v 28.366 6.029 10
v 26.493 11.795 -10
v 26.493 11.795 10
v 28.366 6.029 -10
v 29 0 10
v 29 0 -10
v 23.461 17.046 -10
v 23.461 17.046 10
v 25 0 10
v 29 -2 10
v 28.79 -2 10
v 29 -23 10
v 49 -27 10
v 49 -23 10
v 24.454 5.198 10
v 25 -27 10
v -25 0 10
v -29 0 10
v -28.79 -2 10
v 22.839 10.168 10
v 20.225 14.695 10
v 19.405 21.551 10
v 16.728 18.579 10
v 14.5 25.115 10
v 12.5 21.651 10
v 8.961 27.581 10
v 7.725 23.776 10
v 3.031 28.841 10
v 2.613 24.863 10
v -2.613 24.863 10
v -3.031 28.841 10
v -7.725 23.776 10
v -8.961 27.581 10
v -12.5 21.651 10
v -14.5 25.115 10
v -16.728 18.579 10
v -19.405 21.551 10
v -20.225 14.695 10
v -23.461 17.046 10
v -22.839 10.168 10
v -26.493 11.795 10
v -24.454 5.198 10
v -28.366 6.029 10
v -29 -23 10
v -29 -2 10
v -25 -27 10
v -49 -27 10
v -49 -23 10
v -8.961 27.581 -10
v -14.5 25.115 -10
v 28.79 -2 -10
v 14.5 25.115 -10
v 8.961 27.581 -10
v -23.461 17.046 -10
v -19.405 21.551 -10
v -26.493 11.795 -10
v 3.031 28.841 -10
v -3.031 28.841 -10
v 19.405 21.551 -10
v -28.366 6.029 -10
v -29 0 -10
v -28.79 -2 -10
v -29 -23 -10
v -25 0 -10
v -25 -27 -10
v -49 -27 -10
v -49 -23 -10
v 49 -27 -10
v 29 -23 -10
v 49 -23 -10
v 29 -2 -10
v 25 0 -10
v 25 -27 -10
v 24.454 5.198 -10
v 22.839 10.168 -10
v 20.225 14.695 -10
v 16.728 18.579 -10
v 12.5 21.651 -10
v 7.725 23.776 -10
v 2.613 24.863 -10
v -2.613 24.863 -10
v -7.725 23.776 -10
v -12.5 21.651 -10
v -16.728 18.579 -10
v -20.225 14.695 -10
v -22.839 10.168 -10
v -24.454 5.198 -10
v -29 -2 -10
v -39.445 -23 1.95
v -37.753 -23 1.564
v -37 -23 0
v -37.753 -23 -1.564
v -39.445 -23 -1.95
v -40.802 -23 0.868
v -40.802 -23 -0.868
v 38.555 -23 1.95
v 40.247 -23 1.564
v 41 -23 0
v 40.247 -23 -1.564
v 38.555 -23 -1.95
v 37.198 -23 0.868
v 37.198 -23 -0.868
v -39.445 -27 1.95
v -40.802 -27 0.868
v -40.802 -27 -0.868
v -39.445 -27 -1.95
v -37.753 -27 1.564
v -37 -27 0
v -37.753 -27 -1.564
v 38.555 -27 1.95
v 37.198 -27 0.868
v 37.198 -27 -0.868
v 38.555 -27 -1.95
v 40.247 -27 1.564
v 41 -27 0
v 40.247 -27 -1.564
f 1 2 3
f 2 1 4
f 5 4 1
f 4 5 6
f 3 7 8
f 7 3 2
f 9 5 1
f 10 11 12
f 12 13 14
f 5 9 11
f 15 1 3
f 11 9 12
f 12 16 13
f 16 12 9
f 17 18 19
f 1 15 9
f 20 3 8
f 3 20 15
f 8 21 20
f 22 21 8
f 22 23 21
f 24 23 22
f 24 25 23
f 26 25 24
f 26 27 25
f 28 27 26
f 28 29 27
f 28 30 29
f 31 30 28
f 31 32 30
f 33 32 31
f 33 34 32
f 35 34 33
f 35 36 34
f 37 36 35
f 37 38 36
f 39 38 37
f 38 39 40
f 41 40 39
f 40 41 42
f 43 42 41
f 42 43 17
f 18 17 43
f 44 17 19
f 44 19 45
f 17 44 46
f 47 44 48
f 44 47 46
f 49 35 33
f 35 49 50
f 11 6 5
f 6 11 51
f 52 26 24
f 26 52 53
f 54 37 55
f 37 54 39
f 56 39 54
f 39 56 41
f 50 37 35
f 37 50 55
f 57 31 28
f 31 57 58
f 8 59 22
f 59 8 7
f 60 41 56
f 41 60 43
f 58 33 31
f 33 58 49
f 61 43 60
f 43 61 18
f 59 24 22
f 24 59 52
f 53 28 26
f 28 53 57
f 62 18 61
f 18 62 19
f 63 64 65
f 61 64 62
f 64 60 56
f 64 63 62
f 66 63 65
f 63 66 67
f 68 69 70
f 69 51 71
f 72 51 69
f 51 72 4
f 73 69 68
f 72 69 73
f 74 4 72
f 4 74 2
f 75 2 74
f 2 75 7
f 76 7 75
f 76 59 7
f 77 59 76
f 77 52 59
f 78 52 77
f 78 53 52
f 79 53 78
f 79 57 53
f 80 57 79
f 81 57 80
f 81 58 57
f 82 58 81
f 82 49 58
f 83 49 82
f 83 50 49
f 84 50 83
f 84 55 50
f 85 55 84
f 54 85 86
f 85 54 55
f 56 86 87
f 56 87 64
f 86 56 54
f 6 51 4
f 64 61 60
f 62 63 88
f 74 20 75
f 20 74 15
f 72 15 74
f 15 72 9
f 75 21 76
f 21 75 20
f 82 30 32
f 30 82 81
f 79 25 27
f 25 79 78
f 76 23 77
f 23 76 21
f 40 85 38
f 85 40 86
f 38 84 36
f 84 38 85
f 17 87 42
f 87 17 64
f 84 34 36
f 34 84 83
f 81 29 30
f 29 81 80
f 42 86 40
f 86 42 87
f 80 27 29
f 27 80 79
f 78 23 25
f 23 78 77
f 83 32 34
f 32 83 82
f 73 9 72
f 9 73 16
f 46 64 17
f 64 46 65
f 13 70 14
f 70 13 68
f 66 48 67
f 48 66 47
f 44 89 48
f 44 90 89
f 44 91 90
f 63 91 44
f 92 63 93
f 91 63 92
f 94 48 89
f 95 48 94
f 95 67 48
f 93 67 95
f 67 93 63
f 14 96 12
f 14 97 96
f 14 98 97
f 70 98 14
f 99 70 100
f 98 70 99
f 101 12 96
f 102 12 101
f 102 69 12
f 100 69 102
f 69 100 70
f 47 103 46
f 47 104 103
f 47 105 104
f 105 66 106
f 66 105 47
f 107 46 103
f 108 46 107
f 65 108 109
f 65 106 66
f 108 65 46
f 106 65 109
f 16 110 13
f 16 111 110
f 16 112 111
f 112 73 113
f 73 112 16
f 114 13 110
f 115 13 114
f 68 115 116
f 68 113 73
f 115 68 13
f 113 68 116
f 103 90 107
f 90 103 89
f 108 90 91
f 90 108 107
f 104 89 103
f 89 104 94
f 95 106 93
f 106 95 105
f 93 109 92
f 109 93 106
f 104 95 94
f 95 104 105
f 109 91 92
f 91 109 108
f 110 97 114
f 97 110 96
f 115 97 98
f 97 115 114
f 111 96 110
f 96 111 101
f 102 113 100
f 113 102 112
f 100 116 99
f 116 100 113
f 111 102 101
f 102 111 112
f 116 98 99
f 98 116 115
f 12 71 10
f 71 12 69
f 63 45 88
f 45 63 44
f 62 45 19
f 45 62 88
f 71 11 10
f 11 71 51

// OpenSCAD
// Parametric Saddle Clamp

pipe_od = 50;		// diameter of the pipe to hang
strap_width = 20;		// width of the strap
strap_tab = 20;		// how long you want each screw tab to extend from the saddle
strap_thick = 4;	// thickness of your strap
screw_hole = 4;		// diameter of the screw hole


// No need to edit beyond here unless you want to change how the object is rendered

pipe_rad = pipe_od/2;
screw_rad = screw_hole/2;

union() {

	// the pipe
	difference() {
		cylinder(r=pipe_rad+strap_thick, h=strap_width, center=true);
		cylinder(r=pipe_rad, h=strap_width+1, center=true);
		translate([0,-pipe_rad/2-strap_thick/2,0]) cube(size=[pipe_od, pipe_rad+strap_thick,strap_width], center=true);
	}

	// subtract to make the saddle
	difference() {
		translate([0,-pipe_rad,0]) cube(size=[strap_tab*2+pipe_od+2*strap_thick, strap_thick, strap_width], center=true);
		translate([0,-pipe_rad/2-strap_thick/2,0]) cube(size=[pipe_od, pipe_rad+strap_thick,strap_width], center=true);
		translate([-pipe_rad-strap_tab/2-strap_thick,0,0]) rotate([90,0,0]) cylinder(r=screw_rad, h=100, center=true);
		translate([pipe_rad+strap_tab/2+strap_thick,0,0]) rotate([90,0,0]) cylinder(r=screw_rad, h=100, center=true);
	}

	// make the straps
	difference() {
		translate([0,-pipe_rad/2-strap_thick/2,0]) cube(size=[pipe_od+strap_thick*2, pipe_rad,strap_width], center=true);
		translate([0,-pipe_rad/2-strap_thick/2,0]) cube(size=[pipe_od, pipe_rad,strap_width], center=true);
	}

}
